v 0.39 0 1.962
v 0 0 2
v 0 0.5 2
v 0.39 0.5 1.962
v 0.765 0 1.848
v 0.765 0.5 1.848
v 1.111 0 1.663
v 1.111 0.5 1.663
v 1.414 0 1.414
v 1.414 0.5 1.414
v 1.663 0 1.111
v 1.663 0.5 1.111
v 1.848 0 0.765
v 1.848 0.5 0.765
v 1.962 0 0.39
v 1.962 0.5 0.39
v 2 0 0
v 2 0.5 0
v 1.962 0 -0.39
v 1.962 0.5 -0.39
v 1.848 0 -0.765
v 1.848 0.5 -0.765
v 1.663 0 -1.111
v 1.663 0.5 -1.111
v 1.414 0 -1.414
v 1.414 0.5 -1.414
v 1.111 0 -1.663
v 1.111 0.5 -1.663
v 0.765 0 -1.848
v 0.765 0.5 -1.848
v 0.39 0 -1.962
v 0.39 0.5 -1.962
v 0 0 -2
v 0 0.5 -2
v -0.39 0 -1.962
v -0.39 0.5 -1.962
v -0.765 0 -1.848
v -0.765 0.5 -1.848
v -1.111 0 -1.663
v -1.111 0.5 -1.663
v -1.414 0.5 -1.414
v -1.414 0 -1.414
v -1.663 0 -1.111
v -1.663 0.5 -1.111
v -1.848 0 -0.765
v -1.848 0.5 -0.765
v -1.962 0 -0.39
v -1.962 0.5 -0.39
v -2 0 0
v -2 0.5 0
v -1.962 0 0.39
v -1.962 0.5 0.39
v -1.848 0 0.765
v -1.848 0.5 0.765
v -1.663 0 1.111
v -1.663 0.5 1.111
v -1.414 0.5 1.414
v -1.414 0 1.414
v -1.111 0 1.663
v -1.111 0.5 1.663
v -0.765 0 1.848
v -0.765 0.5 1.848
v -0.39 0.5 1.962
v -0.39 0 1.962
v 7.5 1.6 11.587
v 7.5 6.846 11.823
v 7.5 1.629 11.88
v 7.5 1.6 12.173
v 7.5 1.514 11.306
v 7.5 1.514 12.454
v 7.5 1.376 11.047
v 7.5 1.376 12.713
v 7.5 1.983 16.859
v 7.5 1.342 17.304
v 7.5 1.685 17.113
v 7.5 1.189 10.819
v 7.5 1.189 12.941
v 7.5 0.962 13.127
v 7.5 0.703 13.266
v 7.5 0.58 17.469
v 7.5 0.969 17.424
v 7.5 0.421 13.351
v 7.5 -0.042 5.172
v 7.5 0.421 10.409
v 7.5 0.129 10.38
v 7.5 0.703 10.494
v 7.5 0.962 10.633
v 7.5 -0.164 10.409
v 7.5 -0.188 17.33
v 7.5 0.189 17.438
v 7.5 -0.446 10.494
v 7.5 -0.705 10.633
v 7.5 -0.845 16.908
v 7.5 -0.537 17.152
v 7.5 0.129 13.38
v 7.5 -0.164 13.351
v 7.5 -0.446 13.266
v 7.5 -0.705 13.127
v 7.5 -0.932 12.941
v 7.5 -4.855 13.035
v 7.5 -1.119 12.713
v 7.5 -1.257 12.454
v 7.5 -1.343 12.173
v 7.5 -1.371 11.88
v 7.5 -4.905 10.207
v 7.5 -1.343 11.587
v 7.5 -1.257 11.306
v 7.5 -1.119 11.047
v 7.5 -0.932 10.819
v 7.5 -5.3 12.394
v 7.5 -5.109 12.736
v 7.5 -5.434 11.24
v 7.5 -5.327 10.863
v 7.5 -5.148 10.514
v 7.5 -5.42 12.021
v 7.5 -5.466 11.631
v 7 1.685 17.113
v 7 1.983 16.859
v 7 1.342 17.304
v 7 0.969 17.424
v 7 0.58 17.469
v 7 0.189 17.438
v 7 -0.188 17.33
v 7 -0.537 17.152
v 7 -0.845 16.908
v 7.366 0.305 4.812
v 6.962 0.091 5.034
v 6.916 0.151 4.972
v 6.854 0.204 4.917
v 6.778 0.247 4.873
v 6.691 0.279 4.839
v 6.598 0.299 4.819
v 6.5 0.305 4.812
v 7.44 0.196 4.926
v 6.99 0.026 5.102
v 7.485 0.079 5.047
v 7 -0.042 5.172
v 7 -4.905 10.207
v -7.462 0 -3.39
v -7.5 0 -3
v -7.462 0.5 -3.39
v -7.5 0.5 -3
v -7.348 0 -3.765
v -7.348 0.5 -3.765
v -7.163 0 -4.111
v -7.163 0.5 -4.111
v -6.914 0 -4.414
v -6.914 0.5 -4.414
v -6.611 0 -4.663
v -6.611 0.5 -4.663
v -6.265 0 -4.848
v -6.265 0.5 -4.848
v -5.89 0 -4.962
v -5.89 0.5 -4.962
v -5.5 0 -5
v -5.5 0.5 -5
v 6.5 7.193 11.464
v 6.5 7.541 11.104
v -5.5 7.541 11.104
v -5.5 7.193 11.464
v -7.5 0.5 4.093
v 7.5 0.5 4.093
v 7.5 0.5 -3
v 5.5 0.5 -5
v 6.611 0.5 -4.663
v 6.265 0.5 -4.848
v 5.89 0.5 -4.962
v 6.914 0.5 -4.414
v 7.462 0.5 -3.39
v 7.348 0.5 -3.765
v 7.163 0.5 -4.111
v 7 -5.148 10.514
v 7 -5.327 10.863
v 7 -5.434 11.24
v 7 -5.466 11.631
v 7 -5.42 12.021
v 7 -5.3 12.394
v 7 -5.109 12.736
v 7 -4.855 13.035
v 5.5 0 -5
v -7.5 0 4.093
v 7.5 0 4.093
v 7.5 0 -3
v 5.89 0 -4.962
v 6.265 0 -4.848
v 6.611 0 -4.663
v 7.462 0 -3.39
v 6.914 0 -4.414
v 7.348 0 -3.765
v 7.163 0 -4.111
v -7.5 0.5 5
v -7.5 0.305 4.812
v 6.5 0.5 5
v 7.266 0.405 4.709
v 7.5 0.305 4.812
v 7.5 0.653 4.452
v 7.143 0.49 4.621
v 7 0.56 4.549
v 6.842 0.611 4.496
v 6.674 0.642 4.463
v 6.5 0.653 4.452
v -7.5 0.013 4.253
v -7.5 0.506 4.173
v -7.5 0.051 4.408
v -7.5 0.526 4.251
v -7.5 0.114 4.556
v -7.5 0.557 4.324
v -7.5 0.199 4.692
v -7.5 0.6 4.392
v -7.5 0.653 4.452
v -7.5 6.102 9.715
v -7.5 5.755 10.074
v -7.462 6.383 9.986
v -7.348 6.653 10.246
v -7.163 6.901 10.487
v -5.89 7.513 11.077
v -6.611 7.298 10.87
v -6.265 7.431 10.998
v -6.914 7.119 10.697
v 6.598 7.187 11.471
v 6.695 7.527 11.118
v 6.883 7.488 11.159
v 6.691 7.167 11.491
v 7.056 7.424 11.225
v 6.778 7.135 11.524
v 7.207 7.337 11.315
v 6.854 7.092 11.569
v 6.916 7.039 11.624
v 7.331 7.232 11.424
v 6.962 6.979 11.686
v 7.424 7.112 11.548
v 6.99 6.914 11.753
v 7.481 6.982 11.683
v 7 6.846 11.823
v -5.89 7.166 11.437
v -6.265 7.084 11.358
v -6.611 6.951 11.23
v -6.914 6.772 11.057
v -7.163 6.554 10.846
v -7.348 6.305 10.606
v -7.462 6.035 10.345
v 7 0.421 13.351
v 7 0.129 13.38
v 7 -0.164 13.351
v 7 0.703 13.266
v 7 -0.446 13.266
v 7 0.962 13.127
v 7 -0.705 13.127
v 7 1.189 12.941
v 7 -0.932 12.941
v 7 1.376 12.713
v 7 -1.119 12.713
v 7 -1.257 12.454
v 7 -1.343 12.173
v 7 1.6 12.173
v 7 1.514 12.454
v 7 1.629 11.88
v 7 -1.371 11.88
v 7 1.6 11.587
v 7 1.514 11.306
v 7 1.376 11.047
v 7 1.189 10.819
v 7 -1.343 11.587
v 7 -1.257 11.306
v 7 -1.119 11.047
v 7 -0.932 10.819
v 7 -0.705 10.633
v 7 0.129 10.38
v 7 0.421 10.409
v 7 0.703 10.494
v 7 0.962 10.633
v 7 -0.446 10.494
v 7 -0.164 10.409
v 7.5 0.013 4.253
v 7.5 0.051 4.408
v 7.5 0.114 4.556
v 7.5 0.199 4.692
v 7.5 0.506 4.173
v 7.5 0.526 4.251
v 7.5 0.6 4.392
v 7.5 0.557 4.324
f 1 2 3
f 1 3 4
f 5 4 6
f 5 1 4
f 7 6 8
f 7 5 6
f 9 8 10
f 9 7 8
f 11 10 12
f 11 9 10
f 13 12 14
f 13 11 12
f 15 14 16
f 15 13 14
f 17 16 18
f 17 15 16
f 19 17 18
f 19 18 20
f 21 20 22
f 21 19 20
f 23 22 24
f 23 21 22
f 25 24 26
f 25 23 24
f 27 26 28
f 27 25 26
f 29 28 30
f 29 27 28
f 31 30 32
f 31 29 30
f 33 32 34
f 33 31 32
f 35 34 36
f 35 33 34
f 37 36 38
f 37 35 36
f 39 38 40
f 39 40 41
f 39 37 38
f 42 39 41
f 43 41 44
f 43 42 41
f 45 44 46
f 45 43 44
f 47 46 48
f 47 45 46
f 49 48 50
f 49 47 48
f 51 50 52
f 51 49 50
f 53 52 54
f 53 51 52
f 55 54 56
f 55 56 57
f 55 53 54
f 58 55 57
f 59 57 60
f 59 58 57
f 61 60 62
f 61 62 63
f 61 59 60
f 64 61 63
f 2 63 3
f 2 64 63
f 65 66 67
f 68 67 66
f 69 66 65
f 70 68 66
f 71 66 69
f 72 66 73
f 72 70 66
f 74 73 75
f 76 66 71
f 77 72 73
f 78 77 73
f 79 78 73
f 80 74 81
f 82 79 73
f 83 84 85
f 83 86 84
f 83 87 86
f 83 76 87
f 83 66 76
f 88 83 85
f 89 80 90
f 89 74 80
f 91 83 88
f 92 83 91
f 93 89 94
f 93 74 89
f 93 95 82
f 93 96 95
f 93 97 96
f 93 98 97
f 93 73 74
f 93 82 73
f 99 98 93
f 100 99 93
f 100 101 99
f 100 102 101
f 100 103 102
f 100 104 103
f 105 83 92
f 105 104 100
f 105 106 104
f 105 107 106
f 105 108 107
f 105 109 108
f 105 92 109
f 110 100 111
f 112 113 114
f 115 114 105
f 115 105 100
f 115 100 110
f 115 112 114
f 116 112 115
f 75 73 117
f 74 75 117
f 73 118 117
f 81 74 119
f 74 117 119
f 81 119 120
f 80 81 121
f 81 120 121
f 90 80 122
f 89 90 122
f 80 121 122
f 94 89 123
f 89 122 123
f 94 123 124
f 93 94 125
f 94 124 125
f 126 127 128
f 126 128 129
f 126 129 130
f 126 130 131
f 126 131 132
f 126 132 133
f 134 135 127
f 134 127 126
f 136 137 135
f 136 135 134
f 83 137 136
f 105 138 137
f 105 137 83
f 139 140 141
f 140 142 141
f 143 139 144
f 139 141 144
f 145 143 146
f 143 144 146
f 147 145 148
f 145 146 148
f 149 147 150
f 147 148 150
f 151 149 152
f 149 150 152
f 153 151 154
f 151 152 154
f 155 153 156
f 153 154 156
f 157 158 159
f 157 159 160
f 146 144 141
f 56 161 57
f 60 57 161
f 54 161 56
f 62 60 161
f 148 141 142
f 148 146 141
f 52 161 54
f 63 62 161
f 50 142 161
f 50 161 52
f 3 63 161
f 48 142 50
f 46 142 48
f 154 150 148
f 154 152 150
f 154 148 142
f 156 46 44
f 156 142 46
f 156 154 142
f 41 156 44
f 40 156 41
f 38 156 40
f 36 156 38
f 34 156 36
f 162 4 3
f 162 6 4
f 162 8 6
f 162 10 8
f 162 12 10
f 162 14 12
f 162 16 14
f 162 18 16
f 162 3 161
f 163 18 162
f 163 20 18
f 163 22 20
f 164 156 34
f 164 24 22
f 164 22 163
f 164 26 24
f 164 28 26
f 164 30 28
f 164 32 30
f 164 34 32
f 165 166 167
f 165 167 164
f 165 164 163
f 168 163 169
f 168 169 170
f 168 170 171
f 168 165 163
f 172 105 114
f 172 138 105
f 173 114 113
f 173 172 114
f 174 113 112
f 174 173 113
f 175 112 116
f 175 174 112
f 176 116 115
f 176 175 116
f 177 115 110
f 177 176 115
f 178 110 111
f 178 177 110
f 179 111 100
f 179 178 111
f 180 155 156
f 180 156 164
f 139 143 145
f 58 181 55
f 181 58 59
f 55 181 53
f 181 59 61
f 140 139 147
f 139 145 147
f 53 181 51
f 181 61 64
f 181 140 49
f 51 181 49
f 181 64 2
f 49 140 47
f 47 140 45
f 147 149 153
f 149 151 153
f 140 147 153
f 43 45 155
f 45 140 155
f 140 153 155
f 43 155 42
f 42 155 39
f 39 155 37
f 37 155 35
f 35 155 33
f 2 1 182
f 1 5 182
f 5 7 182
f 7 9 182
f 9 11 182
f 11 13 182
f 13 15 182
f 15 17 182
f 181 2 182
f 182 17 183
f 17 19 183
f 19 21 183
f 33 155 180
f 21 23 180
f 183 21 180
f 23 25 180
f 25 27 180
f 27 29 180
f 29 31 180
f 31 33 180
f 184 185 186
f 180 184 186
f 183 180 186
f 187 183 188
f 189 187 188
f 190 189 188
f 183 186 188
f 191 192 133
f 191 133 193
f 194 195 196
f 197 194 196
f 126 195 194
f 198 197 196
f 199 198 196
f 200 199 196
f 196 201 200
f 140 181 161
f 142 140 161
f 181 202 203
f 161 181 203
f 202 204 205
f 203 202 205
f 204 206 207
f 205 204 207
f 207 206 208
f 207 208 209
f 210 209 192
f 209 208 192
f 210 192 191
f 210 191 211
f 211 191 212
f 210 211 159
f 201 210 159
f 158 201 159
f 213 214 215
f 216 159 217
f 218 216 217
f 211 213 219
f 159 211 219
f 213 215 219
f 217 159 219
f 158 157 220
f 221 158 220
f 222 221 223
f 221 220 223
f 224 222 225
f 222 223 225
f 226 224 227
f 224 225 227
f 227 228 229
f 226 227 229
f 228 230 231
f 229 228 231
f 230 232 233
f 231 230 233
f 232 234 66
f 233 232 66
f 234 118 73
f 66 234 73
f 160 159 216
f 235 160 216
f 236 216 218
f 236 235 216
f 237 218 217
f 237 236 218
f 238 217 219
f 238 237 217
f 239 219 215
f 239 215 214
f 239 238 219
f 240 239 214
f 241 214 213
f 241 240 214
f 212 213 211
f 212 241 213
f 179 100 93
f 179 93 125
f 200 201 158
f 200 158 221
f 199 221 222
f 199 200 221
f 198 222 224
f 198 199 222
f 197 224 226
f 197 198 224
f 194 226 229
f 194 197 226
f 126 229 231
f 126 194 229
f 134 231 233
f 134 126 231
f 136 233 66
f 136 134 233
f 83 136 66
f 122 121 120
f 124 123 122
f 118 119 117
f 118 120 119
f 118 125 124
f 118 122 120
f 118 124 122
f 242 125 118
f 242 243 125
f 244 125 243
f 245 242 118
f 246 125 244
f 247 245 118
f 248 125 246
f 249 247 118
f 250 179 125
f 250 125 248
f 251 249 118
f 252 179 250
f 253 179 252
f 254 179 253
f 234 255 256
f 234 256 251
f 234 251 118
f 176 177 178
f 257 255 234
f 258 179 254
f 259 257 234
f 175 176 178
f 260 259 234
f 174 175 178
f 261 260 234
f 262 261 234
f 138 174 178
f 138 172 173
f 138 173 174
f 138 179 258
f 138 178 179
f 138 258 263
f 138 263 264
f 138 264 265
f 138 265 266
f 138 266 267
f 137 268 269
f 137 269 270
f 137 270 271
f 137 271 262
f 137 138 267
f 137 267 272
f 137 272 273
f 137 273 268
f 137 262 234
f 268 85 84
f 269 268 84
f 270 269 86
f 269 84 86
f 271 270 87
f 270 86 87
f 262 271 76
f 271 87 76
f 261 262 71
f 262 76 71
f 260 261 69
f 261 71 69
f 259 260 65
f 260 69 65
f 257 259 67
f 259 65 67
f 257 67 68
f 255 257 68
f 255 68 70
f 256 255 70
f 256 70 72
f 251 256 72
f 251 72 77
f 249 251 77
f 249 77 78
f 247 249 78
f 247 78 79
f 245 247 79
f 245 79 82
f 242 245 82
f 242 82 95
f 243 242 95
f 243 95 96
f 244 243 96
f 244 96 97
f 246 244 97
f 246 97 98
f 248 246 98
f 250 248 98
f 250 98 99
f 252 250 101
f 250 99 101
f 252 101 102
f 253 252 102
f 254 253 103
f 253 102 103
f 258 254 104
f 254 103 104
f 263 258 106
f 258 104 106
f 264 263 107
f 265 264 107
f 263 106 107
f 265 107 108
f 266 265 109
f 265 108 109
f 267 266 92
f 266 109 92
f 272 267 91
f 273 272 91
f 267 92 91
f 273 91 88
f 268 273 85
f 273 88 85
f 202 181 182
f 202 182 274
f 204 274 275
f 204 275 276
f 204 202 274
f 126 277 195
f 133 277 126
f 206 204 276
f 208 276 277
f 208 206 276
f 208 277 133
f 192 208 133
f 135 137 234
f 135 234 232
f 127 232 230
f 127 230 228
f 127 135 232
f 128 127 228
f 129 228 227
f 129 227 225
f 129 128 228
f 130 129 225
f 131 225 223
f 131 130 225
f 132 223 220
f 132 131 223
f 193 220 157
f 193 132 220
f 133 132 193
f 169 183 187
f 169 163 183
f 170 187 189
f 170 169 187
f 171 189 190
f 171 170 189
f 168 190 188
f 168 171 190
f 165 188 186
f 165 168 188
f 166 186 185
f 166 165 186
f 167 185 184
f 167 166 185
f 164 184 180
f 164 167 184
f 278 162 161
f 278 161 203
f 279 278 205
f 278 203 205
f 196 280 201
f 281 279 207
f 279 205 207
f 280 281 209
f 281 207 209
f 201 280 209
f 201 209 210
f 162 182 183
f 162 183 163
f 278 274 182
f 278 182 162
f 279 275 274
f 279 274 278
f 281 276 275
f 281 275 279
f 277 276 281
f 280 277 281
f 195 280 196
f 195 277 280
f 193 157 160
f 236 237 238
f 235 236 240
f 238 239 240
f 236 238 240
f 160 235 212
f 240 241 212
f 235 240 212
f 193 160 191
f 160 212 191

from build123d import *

# Parameters (mm, degrees)
SKETCH_1_W                       = 15
SKETCH_1_H                       = 10
SKETCH_1_R                       = 2
EXTRUDE_1_DEPTH                  = 0.5
SM_START                         = -7.5
SM_EDGE_FLANGE_1_DEPTH           = 15
SM_EDGE_FLANGE_1_2_DEPTH         = 15
SM_EDGE_FLANGE_2_STRIP_W         = 3
SM_EDGE_FLANGE_2_STRIP_H         = 0.5
SM_EDGE_FLANGE_2_STRIP_CUT_DEPTH = 9.575525184
SM_EDGE_FLANGE_2_DEPTH           = 9.575525184
SKETCH_12_R                      = 1.5
CUT_EXTRUDE_1_DEPTH              = 25.832637406
FILLET_1_R                       = 2


# Read off the part's stored shape, not the designer's step: Ребро-кромка1
# Sheet-metal steps are written as plain solids
with BuildPart() as part:
    # Sketch 1 → Бобышка-Вытянуть1 (new body)
    with BuildSketch(Plane(origin=(0, 0, 0), x_dir=(1, 0, 0), z_dir=(0, 1, 0))):
        Rectangle(SKETCH_1_W, SKETCH_1_H)
        with Locations(Location((0, 0, 0), (0, 0, 270))):
            Circle(SKETCH_1_R, mode=Mode.SUBTRACT)
    extrude(amount=EXTRUDE_1_DEPTH)

    # Ребро-кромка1 outline → Ребро-кромка1 (cut)
    with BuildSketch(Plane.YZ.offset(SM_START)):
        with BuildLine():
            ThreePointArc((0, 4.092680796), (0.079495147, 4.483411925), (0.30534163, 4.812020597))
            Line((0.30534163, 4.812020597), (0.5, 5))
            Line((0.5, 5), (0, 5))
            Line((0, 5), (0, 4.092680796))
        make_face()
    extrude(amount=SM_EDGE_FLANGE_1_DEPTH, mode=Mode.SUBTRACT)

    # Sm Edge Flange 1 2 outline → Sm Edge Flange 1 2 (add)
    with BuildSketch(Plane.YZ.offset(SM_START)):
        with BuildLine():
            Line((7.193398003, 11.463739317), (0.5, 5))
            Line((0.5, 5), (0.5, 4.092680796))
            ThreePointArc((0.5, 4.092680796), (0.539747573, 4.288046361), (0.652670815, 4.452350697))
            Line((0.652670815, 4.452350697), (7.540727189, 11.104069417))
            Line((7.540727189, 11.104069417), (7.193398003, 11.463739317))
        make_face()
    extrude(amount=SM_EDGE_FLANGE_1_2_DEPTH)

    # Ребро-кромка2 strip (across the edge) → Ребро-кромка2 strip cut (cut)
    with BuildSketch(Plane(origin=(7.5, 0.30534163, 4.812020597), x_dir=(-1, 0, 0), z_dir=(0, 0.7193398003386473, 0.6946583704590013))):
        with Locations((-0.5, -0.25)):
            Rectangle(SM_EDGE_FLANGE_2_STRIP_W, SM_EDGE_FLANGE_2_STRIP_H)
    extrude(amount=SM_EDGE_FLANGE_2_STRIP_CUT_DEPTH, mode=Mode.SUBTRACT)

    # Ребро-кромка2 section (across the edge) → Ребро-кромка2 (add)
    with BuildSketch(Plane(origin=(7.5, 0.30534163, 4.812020597), x_dir=(-1, 0, 0), z_dir=(0, 0.7193398003386473, 0.6946583704590013))):
        with BuildLine():
            Line((0, 0.5), (0, 9.5))
            Line((0, 9.5), (0.5, 9.5))
            Line((0.5, 9.5), (0.5, 0.5))
            ThreePointArc((0.5, 0.5), (0.646446609, 0.146446609), (1, 0))
            Line((1, 0), (1, -0.5))
            ThreePointArc((1, -0.5), (0.292893219, -0.207106781), (0, 0.5))
        make_face()
    extrude(amount=SM_EDGE_FLANGE_2_DEPTH)

    # Эскиз12 → Вырез-Вытянуть1 (cut, through all)
    with BuildSketch(Plane(origin=(7.5, 0, 0), x_dir=(0, 0, -1), z_dir=(1, 0, 0))):
        with Locations((-11.879995076, 0.128518841)):
            Circle(SKETCH_12_R)
    extrude(amount=-CUT_EXTRUDE_1_DEPTH, mode=Mode.SUBTRACT)

    # Скругление1
    fillet_1_edges = [part.edges().sort_by_distance(p)[0] for p in [
        (7.25, -6.29391289, 11.6457487),
        (7.25, 0.594143484, 18.29746742),
        (-7.5, 7.367062596, 11.283904367),
        (7.5, 0.25, -5),
        (-7.5, 0.25, -5),
    ]]
    fillet(fillet_1_edges, radius=FILLET_1_R)


solid = part.part
